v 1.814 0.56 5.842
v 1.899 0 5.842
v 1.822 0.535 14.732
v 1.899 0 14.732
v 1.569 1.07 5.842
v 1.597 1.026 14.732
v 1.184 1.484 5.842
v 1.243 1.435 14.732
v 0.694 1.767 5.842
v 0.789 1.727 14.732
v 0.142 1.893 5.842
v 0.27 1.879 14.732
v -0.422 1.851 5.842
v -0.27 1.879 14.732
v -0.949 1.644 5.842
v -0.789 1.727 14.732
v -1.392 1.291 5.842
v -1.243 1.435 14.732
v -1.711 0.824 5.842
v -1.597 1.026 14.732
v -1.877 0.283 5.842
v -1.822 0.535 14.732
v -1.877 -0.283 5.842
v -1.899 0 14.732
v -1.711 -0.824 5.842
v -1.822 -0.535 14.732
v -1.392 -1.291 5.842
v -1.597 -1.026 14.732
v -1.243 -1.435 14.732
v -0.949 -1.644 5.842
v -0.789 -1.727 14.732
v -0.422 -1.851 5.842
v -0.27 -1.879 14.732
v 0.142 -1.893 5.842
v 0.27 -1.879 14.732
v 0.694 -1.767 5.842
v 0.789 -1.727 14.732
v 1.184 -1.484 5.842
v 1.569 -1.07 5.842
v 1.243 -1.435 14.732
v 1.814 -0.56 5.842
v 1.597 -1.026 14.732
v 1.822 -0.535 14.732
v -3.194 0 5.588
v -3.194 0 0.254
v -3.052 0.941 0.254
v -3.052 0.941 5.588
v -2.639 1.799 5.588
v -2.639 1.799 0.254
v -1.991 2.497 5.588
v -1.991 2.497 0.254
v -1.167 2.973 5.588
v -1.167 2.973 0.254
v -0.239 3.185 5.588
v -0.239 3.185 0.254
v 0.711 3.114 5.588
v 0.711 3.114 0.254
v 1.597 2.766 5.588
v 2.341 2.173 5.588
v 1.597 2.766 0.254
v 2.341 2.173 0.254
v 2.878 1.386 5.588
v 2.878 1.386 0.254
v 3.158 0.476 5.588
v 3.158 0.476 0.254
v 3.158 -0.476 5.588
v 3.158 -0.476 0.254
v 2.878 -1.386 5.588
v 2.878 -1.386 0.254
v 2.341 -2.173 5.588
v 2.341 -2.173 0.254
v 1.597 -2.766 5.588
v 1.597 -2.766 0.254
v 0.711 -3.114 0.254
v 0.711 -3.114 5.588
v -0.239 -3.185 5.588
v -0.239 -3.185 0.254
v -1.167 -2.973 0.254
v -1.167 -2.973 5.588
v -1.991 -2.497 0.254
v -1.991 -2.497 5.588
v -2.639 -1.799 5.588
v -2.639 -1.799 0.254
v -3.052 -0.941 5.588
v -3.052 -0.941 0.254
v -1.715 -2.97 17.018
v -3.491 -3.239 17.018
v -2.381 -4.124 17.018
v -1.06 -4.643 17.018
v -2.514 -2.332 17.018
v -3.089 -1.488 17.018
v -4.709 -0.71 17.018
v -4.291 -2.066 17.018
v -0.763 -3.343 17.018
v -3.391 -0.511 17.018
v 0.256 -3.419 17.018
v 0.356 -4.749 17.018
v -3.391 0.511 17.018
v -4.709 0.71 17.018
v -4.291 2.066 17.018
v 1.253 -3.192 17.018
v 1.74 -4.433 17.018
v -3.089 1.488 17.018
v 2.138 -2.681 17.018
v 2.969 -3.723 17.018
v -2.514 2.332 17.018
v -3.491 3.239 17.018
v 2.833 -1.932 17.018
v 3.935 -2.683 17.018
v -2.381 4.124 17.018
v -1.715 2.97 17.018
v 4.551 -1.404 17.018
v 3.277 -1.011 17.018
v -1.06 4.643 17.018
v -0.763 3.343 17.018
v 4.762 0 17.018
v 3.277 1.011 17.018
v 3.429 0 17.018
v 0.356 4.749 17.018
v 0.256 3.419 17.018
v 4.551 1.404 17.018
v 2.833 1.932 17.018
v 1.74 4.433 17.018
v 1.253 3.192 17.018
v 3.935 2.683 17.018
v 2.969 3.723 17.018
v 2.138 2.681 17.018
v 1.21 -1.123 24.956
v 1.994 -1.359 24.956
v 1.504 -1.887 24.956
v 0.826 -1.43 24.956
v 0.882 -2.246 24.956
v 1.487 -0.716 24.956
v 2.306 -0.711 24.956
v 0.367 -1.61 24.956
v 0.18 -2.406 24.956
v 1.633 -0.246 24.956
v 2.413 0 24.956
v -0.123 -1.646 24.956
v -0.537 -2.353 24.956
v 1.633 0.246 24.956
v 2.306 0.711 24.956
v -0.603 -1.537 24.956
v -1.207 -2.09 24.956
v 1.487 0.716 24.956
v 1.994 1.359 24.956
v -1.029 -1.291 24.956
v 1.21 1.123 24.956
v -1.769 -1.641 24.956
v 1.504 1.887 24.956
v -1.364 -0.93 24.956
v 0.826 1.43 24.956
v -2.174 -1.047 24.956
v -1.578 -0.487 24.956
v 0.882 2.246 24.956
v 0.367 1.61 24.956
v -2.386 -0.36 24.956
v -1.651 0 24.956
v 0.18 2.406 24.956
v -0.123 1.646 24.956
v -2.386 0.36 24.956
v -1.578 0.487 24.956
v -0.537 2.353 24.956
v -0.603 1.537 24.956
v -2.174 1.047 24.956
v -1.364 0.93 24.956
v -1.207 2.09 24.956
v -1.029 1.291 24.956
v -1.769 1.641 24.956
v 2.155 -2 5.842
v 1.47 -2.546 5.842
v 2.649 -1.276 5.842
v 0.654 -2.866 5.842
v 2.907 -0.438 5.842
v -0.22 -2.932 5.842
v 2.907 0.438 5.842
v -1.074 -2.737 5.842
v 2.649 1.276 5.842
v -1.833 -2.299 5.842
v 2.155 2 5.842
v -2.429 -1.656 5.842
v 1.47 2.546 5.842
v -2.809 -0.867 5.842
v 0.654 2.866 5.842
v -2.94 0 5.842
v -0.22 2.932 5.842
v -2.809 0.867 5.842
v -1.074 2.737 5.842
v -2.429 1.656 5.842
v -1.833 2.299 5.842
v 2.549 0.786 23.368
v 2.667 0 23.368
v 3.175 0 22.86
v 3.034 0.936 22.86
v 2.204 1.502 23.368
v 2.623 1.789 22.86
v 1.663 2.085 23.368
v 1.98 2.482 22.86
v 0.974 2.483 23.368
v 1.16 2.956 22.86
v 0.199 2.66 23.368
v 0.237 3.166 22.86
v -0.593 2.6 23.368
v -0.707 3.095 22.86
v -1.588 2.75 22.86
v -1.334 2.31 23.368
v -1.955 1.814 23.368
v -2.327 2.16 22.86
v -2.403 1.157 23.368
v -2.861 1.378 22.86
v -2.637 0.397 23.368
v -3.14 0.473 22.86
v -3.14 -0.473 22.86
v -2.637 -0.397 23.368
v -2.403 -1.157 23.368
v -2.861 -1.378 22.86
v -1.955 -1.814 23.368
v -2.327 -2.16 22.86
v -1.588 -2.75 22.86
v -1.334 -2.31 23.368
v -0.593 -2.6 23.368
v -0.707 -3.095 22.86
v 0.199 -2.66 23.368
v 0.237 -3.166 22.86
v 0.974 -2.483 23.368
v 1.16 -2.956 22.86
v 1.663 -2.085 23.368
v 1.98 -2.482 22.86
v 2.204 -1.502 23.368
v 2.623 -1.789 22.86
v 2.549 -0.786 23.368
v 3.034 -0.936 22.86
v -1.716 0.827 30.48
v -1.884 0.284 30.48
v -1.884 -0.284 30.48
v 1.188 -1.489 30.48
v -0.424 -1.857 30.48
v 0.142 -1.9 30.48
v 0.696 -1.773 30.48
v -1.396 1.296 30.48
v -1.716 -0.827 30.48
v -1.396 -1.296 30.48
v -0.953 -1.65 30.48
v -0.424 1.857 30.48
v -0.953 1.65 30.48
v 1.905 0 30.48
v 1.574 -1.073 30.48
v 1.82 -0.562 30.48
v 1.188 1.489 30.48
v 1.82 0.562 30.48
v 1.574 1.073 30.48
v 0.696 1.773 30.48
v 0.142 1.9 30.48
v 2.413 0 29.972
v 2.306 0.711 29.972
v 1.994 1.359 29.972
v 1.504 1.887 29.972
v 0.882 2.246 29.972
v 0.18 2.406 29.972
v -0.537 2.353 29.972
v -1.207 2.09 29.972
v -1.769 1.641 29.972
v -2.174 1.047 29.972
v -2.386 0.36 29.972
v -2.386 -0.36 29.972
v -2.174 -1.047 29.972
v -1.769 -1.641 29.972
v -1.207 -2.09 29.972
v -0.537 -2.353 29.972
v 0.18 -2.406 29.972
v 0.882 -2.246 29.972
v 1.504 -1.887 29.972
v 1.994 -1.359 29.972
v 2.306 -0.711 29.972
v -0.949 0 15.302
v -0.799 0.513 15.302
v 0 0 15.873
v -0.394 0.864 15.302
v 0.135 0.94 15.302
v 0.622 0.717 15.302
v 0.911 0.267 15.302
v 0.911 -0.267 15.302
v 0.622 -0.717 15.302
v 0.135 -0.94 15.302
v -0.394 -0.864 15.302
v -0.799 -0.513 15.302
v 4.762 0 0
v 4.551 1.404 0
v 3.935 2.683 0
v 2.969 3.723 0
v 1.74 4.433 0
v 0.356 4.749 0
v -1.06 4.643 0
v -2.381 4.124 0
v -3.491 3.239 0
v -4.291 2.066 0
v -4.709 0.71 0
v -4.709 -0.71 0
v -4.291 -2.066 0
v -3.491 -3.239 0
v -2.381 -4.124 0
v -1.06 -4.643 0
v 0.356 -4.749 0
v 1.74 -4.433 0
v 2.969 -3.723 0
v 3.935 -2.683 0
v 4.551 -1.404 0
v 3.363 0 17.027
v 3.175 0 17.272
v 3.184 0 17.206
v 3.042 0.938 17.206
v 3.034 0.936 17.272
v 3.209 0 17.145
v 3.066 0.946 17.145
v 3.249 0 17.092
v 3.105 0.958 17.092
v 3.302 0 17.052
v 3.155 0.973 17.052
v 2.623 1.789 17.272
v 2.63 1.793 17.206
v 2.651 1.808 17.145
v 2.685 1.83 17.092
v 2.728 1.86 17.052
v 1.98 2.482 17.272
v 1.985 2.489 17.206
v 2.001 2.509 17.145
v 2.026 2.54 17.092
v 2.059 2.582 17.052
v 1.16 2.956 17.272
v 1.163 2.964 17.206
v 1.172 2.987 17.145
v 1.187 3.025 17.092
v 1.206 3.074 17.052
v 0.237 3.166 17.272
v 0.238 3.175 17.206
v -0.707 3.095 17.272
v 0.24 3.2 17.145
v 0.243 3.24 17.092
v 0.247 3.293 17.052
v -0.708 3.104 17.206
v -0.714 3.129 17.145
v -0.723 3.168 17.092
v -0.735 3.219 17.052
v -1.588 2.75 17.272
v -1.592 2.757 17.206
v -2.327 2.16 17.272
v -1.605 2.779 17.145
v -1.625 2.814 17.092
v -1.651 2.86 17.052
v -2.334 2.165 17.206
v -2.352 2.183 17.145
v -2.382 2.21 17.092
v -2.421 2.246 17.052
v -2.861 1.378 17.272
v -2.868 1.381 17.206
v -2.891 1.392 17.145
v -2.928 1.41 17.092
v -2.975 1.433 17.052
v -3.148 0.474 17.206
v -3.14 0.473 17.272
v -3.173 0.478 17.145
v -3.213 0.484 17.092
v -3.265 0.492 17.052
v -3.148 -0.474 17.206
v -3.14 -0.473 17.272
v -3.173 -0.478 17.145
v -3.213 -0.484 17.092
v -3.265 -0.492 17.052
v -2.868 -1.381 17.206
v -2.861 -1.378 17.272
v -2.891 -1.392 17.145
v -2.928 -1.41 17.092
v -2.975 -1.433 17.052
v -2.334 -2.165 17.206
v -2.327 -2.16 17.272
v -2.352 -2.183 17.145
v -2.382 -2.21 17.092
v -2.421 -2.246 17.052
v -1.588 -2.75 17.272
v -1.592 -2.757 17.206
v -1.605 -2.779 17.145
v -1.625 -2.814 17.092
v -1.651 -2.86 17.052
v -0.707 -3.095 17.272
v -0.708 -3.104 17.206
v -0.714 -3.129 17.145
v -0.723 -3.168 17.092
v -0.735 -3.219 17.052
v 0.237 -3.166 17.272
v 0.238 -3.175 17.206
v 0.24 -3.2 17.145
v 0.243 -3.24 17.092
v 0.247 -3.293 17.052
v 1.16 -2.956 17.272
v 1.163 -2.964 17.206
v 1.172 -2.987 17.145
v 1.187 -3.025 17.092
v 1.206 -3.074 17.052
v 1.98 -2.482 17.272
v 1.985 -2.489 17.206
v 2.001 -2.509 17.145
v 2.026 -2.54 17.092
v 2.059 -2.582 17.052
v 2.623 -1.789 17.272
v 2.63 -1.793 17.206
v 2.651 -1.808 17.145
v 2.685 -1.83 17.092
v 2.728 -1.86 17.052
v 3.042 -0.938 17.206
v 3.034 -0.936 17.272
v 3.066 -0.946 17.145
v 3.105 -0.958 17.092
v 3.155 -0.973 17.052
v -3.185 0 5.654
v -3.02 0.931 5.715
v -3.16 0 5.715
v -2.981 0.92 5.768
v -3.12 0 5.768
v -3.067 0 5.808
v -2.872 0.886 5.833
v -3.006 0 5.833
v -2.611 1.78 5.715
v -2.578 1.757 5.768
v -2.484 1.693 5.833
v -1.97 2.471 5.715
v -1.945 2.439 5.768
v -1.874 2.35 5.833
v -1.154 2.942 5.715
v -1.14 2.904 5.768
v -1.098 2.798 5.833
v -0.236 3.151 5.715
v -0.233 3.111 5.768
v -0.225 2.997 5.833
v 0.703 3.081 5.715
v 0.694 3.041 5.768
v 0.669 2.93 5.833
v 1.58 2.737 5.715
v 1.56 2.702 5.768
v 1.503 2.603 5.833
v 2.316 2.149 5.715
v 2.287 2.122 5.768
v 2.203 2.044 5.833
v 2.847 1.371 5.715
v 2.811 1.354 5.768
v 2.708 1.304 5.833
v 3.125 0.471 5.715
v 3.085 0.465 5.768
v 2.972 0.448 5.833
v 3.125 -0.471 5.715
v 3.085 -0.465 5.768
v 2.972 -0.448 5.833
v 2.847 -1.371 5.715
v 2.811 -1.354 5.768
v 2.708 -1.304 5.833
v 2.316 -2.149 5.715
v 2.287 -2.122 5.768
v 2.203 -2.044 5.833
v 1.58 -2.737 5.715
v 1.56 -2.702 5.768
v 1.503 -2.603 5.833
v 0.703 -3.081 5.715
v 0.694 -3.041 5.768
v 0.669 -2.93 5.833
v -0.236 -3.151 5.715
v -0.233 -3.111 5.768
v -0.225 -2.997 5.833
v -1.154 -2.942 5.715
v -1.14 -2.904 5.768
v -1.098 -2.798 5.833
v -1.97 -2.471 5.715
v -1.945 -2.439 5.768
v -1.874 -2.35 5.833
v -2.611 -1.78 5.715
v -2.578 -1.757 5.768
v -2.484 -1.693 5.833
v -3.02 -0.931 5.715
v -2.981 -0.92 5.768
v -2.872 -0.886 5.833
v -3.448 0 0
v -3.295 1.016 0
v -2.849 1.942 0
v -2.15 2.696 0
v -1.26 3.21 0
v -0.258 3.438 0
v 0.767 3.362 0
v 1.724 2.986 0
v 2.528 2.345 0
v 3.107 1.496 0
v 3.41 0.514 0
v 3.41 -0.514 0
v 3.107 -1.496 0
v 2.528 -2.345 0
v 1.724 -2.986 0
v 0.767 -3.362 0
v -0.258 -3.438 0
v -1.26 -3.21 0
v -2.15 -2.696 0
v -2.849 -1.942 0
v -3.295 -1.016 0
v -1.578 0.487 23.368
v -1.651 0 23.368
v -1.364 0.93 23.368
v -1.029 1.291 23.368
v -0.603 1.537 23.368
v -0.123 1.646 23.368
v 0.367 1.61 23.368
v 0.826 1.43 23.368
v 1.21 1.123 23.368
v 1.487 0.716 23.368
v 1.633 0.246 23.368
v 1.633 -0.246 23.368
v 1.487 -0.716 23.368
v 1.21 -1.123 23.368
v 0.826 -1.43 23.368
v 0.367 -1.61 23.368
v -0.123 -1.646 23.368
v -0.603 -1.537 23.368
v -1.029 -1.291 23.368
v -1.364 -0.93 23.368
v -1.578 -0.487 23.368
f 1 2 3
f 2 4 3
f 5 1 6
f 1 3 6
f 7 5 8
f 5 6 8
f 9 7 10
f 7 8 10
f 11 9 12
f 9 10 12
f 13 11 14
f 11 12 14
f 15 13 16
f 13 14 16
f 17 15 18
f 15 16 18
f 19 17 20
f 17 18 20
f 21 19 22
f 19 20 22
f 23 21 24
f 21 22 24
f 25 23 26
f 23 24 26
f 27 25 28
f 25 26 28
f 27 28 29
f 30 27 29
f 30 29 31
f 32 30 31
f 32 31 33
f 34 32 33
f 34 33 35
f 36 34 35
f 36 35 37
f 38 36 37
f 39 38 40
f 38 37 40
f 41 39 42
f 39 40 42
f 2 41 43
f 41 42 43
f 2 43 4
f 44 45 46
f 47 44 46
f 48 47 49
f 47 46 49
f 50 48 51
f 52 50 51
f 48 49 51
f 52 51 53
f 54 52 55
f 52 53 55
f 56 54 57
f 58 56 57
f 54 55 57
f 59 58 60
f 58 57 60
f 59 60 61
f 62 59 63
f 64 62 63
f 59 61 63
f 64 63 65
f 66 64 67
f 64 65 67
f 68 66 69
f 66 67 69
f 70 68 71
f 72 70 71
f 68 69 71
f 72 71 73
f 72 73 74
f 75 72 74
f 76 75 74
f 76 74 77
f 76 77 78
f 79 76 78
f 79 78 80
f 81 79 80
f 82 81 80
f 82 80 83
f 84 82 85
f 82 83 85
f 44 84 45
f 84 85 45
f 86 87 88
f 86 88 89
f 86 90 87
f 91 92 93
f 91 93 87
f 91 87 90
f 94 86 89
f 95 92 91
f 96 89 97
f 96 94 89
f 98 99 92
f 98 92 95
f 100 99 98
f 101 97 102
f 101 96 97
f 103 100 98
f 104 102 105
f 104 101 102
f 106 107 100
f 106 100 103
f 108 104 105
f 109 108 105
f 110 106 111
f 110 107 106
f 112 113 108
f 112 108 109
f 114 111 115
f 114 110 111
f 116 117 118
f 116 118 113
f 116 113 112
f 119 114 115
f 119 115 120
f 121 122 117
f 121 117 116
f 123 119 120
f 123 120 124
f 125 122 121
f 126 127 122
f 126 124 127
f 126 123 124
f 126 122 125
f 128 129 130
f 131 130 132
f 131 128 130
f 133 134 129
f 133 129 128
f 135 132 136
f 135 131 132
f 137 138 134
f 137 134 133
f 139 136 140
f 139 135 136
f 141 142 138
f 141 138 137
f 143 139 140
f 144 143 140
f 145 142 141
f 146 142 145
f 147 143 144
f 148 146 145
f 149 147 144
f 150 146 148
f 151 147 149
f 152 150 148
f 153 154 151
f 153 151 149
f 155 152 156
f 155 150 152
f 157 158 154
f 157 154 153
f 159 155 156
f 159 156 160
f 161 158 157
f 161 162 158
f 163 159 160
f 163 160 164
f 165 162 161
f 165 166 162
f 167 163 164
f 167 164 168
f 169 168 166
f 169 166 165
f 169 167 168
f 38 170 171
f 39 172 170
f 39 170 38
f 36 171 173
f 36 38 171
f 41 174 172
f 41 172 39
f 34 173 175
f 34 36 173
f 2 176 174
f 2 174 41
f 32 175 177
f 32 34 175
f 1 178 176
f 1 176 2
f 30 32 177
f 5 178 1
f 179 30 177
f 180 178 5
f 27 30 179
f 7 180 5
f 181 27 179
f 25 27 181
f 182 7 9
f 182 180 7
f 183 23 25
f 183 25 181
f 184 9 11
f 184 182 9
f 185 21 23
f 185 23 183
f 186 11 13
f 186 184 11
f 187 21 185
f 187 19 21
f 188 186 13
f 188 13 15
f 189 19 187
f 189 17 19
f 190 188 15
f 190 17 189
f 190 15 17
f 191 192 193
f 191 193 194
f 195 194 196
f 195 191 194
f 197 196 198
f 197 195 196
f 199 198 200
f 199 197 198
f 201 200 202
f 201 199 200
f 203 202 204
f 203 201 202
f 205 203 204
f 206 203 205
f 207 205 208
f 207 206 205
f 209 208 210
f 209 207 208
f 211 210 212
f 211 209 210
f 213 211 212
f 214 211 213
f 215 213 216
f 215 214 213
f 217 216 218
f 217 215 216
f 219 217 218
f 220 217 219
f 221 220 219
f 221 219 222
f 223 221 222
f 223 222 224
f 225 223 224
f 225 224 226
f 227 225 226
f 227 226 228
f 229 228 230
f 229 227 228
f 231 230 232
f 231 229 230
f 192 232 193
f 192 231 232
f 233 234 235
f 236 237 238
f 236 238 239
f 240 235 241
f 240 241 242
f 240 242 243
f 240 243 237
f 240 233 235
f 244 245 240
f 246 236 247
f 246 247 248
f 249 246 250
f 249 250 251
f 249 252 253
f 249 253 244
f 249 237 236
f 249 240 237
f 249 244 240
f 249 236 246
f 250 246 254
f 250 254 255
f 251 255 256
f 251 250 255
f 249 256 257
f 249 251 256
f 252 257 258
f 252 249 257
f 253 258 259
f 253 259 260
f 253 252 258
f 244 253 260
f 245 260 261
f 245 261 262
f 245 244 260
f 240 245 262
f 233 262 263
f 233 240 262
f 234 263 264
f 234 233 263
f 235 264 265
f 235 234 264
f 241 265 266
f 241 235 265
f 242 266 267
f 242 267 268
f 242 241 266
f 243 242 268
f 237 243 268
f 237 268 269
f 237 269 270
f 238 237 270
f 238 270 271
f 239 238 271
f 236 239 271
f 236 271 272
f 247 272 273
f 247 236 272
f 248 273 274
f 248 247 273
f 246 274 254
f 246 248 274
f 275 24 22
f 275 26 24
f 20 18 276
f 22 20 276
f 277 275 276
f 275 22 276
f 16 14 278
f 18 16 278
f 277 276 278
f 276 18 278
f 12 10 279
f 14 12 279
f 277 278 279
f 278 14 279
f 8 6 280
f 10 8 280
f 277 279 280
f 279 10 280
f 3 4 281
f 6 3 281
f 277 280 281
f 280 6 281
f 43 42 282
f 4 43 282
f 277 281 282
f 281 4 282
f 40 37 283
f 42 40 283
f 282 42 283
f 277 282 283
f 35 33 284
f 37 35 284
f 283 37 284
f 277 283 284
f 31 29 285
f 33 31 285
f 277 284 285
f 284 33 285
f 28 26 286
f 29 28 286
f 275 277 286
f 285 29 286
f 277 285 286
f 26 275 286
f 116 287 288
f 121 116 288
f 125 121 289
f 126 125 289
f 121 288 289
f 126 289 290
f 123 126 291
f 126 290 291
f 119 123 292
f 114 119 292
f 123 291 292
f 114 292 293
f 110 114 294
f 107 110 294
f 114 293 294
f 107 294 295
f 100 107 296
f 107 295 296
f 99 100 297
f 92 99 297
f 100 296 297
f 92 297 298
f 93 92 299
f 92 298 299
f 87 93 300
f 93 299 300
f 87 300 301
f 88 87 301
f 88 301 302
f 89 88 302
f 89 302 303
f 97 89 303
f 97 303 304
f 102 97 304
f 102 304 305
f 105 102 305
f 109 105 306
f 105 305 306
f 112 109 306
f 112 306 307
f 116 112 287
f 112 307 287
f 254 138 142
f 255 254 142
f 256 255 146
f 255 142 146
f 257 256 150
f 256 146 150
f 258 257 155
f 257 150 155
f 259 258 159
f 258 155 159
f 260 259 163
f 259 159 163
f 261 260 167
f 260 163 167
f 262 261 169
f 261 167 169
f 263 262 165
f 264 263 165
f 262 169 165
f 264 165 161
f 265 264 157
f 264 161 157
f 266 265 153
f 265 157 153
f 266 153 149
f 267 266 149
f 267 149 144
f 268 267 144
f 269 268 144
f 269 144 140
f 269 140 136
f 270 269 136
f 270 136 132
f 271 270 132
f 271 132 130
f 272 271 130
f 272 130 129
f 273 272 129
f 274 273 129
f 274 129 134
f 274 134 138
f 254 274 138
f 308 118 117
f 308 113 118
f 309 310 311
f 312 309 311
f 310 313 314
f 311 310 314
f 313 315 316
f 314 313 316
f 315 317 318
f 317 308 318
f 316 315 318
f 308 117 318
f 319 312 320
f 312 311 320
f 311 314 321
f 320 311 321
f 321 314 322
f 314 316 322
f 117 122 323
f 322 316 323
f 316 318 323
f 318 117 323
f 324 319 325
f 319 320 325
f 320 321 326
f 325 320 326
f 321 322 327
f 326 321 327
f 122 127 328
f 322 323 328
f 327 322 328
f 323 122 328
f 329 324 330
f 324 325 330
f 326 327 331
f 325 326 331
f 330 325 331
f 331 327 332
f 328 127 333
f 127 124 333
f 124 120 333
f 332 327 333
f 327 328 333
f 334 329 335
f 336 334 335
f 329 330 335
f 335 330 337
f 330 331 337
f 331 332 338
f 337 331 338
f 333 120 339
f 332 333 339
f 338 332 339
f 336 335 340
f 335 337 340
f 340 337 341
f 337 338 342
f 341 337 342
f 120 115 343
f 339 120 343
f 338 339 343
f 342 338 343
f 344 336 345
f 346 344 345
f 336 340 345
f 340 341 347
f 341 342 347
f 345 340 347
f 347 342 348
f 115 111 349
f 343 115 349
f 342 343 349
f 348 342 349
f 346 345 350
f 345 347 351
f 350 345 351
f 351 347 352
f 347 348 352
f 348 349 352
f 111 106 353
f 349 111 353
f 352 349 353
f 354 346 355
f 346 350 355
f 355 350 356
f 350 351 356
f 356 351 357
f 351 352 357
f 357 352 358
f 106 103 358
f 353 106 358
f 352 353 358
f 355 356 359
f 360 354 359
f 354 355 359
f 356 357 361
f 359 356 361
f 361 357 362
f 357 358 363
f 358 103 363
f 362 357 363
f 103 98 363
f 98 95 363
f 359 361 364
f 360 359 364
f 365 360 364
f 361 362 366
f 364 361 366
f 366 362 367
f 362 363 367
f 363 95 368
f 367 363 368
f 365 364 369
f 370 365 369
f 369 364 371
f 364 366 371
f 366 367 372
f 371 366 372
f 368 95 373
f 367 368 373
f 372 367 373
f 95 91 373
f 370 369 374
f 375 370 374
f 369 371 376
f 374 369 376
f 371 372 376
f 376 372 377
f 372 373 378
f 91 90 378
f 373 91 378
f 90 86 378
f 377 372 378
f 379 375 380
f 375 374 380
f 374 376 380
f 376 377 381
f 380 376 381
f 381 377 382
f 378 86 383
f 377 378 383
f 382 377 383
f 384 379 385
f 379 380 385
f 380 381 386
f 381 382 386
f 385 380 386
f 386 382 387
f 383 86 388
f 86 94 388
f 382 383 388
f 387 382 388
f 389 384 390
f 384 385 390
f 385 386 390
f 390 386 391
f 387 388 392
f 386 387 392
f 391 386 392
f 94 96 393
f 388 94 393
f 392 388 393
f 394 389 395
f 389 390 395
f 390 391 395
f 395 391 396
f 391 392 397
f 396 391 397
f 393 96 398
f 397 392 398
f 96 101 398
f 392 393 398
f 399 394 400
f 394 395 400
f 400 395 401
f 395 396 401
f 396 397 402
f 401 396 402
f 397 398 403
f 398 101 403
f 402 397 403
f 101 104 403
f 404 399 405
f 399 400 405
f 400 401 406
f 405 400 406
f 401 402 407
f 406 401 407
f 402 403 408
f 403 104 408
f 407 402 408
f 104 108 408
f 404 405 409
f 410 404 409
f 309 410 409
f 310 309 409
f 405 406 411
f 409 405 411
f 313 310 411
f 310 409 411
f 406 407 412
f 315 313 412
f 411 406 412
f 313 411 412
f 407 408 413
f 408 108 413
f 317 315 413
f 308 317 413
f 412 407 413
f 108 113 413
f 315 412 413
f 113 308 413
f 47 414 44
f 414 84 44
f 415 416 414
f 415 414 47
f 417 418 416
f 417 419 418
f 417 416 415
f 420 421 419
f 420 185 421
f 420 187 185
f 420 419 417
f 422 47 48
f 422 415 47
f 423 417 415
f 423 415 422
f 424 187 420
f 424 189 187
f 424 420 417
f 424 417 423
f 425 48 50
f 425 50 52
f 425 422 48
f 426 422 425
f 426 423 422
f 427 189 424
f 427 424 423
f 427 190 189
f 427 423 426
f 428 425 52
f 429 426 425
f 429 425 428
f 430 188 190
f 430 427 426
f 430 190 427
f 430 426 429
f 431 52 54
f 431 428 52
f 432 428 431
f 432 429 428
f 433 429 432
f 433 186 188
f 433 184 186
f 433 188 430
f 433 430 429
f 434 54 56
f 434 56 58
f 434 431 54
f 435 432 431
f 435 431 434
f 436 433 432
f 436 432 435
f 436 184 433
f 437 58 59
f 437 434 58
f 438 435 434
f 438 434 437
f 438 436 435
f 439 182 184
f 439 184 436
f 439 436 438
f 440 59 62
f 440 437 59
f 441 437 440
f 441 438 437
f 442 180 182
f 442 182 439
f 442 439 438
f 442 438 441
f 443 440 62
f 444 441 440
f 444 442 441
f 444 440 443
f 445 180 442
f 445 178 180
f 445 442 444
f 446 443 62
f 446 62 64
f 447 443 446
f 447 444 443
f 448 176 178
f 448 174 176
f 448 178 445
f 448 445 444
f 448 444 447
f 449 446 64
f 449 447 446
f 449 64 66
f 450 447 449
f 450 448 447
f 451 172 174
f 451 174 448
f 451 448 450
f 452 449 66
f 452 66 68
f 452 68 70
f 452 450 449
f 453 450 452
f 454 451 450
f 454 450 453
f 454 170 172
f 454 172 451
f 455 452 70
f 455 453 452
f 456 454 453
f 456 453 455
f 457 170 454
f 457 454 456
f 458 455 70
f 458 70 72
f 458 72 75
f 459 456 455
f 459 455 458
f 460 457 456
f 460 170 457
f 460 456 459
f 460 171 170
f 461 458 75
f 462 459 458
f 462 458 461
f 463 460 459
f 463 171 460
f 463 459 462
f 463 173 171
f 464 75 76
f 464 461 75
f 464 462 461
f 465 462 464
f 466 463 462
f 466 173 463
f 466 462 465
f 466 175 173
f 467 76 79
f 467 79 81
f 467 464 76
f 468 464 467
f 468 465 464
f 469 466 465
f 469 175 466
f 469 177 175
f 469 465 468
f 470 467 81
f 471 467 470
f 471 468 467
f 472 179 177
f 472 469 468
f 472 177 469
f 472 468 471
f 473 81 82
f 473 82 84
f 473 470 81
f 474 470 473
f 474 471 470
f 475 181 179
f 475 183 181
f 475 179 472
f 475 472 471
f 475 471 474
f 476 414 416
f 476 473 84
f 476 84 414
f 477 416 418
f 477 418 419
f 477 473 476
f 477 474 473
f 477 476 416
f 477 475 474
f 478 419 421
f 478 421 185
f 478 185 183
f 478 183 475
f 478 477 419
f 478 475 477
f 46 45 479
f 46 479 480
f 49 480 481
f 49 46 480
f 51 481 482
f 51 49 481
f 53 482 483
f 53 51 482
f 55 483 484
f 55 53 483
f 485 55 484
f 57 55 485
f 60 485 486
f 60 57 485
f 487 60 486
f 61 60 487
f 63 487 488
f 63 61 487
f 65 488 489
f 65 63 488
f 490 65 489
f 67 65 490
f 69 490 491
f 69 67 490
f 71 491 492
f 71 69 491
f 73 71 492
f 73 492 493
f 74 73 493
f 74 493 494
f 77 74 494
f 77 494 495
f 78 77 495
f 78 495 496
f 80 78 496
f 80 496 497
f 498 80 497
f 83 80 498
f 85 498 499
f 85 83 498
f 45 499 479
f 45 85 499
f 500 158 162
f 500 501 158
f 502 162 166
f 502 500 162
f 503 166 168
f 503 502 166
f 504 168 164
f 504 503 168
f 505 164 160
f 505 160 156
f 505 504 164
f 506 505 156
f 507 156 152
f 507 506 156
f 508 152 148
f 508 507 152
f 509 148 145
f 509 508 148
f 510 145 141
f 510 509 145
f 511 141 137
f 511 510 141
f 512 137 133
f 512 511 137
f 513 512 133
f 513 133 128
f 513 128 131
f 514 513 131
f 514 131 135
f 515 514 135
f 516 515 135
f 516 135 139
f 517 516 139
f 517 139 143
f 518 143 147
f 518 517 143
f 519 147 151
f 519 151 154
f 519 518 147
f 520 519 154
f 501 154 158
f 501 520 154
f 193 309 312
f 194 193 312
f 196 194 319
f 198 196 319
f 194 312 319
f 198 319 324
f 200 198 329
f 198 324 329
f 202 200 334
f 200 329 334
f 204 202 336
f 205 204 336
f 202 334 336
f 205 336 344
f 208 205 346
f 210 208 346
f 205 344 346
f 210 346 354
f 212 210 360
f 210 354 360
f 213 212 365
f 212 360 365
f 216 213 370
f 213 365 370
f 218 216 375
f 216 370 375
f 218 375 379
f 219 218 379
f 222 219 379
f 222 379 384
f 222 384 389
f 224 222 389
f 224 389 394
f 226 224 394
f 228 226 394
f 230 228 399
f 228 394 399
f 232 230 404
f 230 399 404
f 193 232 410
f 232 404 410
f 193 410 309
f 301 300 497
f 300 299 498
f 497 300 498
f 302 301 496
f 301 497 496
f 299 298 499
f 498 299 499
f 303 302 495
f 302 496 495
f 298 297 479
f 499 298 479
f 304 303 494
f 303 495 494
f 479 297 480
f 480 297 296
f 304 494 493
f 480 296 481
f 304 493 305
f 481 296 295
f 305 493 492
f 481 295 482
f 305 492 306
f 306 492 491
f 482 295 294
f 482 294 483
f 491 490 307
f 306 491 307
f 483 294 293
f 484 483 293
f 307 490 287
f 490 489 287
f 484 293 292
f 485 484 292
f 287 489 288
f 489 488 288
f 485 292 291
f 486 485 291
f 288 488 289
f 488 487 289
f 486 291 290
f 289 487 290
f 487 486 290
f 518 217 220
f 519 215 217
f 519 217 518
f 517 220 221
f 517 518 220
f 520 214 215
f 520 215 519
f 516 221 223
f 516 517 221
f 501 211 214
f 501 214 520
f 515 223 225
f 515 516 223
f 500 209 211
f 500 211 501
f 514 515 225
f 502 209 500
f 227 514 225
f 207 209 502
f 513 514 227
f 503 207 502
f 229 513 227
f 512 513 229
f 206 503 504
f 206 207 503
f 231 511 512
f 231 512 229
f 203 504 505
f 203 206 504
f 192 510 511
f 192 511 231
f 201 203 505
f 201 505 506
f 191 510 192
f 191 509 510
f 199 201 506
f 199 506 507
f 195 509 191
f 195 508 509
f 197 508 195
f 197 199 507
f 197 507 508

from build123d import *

# Parameters (mm, degrees)
SKETCH1_R                  = 4.7625
BOSS_EXTRUDE1_DEPTH        = 17.018
SKETCH2_R                  = 3.175
BOSS_EXTRUDE2_DEPTH        = 6.35
SKETCH4_R                  = 2.413
BOSS_EXTRUDE3_DEPTH        = 7.112
SKETCH5_R                  = 3.19405
CUT_EXTRUDE2_DEPTH         = 5.842
CHAMFER1_SIZE              = 0.254
FILLET1_R                  = 0.254
CHAMFER2_SIZE              = 0.508
F_10_24_TAPPED_HOLE1_D     = 3.7973
F_10_24_TAPPED_HOLE1_DEPTH = 8.89
F_10_24_TAPPED_HOLE1_TIP   = 1.140824014
CHAMFER3_SIZE              = 0.508
SKETCH10_W                 = 0.762
SKETCH10_H                 = 1.5875
FILLET2_R                  = 0.254


with BuildPart() as part:
    # Sketch1 → Boss-Extrude1 (new body)
    with BuildSketch(Plane.XY):
        Circle(SKETCH1_R)
    extrude(amount=BOSS_EXTRUDE1_DEPTH)

    # Sketch2 → Boss-Extrude2 (add)
    with BuildSketch(Plane.XY.offset(17.018)):
        Circle(SKETCH2_R)
    extrude(amount=BOSS_EXTRUDE2_DEPTH)

    # Sketch4 → Boss-Extrude3 (add)
    with BuildSketch(Plane.XY.offset(23.368)):
        Circle(SKETCH4_R)
    extrude(amount=BOSS_EXTRUDE3_DEPTH)

    # Sketch5 → Cut-Extrude2 (cut)
    with BuildSketch(Plane(origin=(0, 0, 0), x_dir=(-1, 0, 0), z_dir=(0, 0, -1))):
        Circle(SKETCH5_R)
    extrude(amount=-CUT_EXTRUDE2_DEPTH, mode=Mode.SUBTRACT)

    # Chamfer1
    chamfer1_edges = [part.edges().sort_by_distance(p)[0] for p in [
        (3.19405, 0, 0),
    ]]
    chamfer(chamfer1_edges, length=CHAMFER1_SIZE)

    # Fillet1
    fillet1_edges = [part.edges().sort_by_distance(p)[0] for p in [
        (3.19405, 0, 5.842),
    ]]
    fillet(fillet1_edges, radius=FILLET1_R)

    # Chamfer2
    chamfer2_edges = [part.edges().sort_by_distance(p)[0] for p in [
        (-3.175, 0, 23.368),
    ]]
    chamfer(chamfer2_edges, length=CHAMFER2_SIZE)

    # #10-24 Tapped Hole1
    with Locations(Plane(origin=(0, 0, 5.842), x_dir=(-1, 0, 0), z_dir=(0, 0, -1))):
        with Locations((0, 0)):
            Hole(F_10_24_TAPPED_HOLE1_D / 2, depth=F_10_24_TAPPED_HOLE1_DEPTH)
            with Locations((0, 0, -(F_10_24_TAPPED_HOLE1_DEPTH + F_10_24_TAPPED_HOLE1_TIP / 2))):  # 118° drill point
                Cone(0, F_10_24_TAPPED_HOLE1_D / 2, F_10_24_TAPPED_HOLE1_TIP, mode=Mode.SUBTRACT)

    # Chamfer3
    chamfer3_edges = [part.edges().sort_by_distance(p)[0] for p in [
        (-2.413, 0, 30.48),
    ]]
    chamfer(chamfer3_edges, length=CHAMFER3_SIZE)

    # Sketch10 → Cut-Revolve1 (revolve, cut)
    with BuildSketch(Plane(origin=(0, 0, 0), x_dir=(1, 0, 0), z_dir=(0, 1, 0))):
        with Locations((-2.032, -24.16175)):
            Rectangle(SKETCH10_W, SKETCH10_H)
    revolve(axis=Axis((0, 0, 29.927585912), (0, 0, -1)), mode=Mode.SUBTRACT)

    # Fillet2
    fillet2_edges = [part.edges().sort_by_distance(p)[0] for p in [
        (-3.175, 0, 17.018),
    ]]
    fillet(fillet2_edges, radius=FILLET2_R)


solid = part.part
